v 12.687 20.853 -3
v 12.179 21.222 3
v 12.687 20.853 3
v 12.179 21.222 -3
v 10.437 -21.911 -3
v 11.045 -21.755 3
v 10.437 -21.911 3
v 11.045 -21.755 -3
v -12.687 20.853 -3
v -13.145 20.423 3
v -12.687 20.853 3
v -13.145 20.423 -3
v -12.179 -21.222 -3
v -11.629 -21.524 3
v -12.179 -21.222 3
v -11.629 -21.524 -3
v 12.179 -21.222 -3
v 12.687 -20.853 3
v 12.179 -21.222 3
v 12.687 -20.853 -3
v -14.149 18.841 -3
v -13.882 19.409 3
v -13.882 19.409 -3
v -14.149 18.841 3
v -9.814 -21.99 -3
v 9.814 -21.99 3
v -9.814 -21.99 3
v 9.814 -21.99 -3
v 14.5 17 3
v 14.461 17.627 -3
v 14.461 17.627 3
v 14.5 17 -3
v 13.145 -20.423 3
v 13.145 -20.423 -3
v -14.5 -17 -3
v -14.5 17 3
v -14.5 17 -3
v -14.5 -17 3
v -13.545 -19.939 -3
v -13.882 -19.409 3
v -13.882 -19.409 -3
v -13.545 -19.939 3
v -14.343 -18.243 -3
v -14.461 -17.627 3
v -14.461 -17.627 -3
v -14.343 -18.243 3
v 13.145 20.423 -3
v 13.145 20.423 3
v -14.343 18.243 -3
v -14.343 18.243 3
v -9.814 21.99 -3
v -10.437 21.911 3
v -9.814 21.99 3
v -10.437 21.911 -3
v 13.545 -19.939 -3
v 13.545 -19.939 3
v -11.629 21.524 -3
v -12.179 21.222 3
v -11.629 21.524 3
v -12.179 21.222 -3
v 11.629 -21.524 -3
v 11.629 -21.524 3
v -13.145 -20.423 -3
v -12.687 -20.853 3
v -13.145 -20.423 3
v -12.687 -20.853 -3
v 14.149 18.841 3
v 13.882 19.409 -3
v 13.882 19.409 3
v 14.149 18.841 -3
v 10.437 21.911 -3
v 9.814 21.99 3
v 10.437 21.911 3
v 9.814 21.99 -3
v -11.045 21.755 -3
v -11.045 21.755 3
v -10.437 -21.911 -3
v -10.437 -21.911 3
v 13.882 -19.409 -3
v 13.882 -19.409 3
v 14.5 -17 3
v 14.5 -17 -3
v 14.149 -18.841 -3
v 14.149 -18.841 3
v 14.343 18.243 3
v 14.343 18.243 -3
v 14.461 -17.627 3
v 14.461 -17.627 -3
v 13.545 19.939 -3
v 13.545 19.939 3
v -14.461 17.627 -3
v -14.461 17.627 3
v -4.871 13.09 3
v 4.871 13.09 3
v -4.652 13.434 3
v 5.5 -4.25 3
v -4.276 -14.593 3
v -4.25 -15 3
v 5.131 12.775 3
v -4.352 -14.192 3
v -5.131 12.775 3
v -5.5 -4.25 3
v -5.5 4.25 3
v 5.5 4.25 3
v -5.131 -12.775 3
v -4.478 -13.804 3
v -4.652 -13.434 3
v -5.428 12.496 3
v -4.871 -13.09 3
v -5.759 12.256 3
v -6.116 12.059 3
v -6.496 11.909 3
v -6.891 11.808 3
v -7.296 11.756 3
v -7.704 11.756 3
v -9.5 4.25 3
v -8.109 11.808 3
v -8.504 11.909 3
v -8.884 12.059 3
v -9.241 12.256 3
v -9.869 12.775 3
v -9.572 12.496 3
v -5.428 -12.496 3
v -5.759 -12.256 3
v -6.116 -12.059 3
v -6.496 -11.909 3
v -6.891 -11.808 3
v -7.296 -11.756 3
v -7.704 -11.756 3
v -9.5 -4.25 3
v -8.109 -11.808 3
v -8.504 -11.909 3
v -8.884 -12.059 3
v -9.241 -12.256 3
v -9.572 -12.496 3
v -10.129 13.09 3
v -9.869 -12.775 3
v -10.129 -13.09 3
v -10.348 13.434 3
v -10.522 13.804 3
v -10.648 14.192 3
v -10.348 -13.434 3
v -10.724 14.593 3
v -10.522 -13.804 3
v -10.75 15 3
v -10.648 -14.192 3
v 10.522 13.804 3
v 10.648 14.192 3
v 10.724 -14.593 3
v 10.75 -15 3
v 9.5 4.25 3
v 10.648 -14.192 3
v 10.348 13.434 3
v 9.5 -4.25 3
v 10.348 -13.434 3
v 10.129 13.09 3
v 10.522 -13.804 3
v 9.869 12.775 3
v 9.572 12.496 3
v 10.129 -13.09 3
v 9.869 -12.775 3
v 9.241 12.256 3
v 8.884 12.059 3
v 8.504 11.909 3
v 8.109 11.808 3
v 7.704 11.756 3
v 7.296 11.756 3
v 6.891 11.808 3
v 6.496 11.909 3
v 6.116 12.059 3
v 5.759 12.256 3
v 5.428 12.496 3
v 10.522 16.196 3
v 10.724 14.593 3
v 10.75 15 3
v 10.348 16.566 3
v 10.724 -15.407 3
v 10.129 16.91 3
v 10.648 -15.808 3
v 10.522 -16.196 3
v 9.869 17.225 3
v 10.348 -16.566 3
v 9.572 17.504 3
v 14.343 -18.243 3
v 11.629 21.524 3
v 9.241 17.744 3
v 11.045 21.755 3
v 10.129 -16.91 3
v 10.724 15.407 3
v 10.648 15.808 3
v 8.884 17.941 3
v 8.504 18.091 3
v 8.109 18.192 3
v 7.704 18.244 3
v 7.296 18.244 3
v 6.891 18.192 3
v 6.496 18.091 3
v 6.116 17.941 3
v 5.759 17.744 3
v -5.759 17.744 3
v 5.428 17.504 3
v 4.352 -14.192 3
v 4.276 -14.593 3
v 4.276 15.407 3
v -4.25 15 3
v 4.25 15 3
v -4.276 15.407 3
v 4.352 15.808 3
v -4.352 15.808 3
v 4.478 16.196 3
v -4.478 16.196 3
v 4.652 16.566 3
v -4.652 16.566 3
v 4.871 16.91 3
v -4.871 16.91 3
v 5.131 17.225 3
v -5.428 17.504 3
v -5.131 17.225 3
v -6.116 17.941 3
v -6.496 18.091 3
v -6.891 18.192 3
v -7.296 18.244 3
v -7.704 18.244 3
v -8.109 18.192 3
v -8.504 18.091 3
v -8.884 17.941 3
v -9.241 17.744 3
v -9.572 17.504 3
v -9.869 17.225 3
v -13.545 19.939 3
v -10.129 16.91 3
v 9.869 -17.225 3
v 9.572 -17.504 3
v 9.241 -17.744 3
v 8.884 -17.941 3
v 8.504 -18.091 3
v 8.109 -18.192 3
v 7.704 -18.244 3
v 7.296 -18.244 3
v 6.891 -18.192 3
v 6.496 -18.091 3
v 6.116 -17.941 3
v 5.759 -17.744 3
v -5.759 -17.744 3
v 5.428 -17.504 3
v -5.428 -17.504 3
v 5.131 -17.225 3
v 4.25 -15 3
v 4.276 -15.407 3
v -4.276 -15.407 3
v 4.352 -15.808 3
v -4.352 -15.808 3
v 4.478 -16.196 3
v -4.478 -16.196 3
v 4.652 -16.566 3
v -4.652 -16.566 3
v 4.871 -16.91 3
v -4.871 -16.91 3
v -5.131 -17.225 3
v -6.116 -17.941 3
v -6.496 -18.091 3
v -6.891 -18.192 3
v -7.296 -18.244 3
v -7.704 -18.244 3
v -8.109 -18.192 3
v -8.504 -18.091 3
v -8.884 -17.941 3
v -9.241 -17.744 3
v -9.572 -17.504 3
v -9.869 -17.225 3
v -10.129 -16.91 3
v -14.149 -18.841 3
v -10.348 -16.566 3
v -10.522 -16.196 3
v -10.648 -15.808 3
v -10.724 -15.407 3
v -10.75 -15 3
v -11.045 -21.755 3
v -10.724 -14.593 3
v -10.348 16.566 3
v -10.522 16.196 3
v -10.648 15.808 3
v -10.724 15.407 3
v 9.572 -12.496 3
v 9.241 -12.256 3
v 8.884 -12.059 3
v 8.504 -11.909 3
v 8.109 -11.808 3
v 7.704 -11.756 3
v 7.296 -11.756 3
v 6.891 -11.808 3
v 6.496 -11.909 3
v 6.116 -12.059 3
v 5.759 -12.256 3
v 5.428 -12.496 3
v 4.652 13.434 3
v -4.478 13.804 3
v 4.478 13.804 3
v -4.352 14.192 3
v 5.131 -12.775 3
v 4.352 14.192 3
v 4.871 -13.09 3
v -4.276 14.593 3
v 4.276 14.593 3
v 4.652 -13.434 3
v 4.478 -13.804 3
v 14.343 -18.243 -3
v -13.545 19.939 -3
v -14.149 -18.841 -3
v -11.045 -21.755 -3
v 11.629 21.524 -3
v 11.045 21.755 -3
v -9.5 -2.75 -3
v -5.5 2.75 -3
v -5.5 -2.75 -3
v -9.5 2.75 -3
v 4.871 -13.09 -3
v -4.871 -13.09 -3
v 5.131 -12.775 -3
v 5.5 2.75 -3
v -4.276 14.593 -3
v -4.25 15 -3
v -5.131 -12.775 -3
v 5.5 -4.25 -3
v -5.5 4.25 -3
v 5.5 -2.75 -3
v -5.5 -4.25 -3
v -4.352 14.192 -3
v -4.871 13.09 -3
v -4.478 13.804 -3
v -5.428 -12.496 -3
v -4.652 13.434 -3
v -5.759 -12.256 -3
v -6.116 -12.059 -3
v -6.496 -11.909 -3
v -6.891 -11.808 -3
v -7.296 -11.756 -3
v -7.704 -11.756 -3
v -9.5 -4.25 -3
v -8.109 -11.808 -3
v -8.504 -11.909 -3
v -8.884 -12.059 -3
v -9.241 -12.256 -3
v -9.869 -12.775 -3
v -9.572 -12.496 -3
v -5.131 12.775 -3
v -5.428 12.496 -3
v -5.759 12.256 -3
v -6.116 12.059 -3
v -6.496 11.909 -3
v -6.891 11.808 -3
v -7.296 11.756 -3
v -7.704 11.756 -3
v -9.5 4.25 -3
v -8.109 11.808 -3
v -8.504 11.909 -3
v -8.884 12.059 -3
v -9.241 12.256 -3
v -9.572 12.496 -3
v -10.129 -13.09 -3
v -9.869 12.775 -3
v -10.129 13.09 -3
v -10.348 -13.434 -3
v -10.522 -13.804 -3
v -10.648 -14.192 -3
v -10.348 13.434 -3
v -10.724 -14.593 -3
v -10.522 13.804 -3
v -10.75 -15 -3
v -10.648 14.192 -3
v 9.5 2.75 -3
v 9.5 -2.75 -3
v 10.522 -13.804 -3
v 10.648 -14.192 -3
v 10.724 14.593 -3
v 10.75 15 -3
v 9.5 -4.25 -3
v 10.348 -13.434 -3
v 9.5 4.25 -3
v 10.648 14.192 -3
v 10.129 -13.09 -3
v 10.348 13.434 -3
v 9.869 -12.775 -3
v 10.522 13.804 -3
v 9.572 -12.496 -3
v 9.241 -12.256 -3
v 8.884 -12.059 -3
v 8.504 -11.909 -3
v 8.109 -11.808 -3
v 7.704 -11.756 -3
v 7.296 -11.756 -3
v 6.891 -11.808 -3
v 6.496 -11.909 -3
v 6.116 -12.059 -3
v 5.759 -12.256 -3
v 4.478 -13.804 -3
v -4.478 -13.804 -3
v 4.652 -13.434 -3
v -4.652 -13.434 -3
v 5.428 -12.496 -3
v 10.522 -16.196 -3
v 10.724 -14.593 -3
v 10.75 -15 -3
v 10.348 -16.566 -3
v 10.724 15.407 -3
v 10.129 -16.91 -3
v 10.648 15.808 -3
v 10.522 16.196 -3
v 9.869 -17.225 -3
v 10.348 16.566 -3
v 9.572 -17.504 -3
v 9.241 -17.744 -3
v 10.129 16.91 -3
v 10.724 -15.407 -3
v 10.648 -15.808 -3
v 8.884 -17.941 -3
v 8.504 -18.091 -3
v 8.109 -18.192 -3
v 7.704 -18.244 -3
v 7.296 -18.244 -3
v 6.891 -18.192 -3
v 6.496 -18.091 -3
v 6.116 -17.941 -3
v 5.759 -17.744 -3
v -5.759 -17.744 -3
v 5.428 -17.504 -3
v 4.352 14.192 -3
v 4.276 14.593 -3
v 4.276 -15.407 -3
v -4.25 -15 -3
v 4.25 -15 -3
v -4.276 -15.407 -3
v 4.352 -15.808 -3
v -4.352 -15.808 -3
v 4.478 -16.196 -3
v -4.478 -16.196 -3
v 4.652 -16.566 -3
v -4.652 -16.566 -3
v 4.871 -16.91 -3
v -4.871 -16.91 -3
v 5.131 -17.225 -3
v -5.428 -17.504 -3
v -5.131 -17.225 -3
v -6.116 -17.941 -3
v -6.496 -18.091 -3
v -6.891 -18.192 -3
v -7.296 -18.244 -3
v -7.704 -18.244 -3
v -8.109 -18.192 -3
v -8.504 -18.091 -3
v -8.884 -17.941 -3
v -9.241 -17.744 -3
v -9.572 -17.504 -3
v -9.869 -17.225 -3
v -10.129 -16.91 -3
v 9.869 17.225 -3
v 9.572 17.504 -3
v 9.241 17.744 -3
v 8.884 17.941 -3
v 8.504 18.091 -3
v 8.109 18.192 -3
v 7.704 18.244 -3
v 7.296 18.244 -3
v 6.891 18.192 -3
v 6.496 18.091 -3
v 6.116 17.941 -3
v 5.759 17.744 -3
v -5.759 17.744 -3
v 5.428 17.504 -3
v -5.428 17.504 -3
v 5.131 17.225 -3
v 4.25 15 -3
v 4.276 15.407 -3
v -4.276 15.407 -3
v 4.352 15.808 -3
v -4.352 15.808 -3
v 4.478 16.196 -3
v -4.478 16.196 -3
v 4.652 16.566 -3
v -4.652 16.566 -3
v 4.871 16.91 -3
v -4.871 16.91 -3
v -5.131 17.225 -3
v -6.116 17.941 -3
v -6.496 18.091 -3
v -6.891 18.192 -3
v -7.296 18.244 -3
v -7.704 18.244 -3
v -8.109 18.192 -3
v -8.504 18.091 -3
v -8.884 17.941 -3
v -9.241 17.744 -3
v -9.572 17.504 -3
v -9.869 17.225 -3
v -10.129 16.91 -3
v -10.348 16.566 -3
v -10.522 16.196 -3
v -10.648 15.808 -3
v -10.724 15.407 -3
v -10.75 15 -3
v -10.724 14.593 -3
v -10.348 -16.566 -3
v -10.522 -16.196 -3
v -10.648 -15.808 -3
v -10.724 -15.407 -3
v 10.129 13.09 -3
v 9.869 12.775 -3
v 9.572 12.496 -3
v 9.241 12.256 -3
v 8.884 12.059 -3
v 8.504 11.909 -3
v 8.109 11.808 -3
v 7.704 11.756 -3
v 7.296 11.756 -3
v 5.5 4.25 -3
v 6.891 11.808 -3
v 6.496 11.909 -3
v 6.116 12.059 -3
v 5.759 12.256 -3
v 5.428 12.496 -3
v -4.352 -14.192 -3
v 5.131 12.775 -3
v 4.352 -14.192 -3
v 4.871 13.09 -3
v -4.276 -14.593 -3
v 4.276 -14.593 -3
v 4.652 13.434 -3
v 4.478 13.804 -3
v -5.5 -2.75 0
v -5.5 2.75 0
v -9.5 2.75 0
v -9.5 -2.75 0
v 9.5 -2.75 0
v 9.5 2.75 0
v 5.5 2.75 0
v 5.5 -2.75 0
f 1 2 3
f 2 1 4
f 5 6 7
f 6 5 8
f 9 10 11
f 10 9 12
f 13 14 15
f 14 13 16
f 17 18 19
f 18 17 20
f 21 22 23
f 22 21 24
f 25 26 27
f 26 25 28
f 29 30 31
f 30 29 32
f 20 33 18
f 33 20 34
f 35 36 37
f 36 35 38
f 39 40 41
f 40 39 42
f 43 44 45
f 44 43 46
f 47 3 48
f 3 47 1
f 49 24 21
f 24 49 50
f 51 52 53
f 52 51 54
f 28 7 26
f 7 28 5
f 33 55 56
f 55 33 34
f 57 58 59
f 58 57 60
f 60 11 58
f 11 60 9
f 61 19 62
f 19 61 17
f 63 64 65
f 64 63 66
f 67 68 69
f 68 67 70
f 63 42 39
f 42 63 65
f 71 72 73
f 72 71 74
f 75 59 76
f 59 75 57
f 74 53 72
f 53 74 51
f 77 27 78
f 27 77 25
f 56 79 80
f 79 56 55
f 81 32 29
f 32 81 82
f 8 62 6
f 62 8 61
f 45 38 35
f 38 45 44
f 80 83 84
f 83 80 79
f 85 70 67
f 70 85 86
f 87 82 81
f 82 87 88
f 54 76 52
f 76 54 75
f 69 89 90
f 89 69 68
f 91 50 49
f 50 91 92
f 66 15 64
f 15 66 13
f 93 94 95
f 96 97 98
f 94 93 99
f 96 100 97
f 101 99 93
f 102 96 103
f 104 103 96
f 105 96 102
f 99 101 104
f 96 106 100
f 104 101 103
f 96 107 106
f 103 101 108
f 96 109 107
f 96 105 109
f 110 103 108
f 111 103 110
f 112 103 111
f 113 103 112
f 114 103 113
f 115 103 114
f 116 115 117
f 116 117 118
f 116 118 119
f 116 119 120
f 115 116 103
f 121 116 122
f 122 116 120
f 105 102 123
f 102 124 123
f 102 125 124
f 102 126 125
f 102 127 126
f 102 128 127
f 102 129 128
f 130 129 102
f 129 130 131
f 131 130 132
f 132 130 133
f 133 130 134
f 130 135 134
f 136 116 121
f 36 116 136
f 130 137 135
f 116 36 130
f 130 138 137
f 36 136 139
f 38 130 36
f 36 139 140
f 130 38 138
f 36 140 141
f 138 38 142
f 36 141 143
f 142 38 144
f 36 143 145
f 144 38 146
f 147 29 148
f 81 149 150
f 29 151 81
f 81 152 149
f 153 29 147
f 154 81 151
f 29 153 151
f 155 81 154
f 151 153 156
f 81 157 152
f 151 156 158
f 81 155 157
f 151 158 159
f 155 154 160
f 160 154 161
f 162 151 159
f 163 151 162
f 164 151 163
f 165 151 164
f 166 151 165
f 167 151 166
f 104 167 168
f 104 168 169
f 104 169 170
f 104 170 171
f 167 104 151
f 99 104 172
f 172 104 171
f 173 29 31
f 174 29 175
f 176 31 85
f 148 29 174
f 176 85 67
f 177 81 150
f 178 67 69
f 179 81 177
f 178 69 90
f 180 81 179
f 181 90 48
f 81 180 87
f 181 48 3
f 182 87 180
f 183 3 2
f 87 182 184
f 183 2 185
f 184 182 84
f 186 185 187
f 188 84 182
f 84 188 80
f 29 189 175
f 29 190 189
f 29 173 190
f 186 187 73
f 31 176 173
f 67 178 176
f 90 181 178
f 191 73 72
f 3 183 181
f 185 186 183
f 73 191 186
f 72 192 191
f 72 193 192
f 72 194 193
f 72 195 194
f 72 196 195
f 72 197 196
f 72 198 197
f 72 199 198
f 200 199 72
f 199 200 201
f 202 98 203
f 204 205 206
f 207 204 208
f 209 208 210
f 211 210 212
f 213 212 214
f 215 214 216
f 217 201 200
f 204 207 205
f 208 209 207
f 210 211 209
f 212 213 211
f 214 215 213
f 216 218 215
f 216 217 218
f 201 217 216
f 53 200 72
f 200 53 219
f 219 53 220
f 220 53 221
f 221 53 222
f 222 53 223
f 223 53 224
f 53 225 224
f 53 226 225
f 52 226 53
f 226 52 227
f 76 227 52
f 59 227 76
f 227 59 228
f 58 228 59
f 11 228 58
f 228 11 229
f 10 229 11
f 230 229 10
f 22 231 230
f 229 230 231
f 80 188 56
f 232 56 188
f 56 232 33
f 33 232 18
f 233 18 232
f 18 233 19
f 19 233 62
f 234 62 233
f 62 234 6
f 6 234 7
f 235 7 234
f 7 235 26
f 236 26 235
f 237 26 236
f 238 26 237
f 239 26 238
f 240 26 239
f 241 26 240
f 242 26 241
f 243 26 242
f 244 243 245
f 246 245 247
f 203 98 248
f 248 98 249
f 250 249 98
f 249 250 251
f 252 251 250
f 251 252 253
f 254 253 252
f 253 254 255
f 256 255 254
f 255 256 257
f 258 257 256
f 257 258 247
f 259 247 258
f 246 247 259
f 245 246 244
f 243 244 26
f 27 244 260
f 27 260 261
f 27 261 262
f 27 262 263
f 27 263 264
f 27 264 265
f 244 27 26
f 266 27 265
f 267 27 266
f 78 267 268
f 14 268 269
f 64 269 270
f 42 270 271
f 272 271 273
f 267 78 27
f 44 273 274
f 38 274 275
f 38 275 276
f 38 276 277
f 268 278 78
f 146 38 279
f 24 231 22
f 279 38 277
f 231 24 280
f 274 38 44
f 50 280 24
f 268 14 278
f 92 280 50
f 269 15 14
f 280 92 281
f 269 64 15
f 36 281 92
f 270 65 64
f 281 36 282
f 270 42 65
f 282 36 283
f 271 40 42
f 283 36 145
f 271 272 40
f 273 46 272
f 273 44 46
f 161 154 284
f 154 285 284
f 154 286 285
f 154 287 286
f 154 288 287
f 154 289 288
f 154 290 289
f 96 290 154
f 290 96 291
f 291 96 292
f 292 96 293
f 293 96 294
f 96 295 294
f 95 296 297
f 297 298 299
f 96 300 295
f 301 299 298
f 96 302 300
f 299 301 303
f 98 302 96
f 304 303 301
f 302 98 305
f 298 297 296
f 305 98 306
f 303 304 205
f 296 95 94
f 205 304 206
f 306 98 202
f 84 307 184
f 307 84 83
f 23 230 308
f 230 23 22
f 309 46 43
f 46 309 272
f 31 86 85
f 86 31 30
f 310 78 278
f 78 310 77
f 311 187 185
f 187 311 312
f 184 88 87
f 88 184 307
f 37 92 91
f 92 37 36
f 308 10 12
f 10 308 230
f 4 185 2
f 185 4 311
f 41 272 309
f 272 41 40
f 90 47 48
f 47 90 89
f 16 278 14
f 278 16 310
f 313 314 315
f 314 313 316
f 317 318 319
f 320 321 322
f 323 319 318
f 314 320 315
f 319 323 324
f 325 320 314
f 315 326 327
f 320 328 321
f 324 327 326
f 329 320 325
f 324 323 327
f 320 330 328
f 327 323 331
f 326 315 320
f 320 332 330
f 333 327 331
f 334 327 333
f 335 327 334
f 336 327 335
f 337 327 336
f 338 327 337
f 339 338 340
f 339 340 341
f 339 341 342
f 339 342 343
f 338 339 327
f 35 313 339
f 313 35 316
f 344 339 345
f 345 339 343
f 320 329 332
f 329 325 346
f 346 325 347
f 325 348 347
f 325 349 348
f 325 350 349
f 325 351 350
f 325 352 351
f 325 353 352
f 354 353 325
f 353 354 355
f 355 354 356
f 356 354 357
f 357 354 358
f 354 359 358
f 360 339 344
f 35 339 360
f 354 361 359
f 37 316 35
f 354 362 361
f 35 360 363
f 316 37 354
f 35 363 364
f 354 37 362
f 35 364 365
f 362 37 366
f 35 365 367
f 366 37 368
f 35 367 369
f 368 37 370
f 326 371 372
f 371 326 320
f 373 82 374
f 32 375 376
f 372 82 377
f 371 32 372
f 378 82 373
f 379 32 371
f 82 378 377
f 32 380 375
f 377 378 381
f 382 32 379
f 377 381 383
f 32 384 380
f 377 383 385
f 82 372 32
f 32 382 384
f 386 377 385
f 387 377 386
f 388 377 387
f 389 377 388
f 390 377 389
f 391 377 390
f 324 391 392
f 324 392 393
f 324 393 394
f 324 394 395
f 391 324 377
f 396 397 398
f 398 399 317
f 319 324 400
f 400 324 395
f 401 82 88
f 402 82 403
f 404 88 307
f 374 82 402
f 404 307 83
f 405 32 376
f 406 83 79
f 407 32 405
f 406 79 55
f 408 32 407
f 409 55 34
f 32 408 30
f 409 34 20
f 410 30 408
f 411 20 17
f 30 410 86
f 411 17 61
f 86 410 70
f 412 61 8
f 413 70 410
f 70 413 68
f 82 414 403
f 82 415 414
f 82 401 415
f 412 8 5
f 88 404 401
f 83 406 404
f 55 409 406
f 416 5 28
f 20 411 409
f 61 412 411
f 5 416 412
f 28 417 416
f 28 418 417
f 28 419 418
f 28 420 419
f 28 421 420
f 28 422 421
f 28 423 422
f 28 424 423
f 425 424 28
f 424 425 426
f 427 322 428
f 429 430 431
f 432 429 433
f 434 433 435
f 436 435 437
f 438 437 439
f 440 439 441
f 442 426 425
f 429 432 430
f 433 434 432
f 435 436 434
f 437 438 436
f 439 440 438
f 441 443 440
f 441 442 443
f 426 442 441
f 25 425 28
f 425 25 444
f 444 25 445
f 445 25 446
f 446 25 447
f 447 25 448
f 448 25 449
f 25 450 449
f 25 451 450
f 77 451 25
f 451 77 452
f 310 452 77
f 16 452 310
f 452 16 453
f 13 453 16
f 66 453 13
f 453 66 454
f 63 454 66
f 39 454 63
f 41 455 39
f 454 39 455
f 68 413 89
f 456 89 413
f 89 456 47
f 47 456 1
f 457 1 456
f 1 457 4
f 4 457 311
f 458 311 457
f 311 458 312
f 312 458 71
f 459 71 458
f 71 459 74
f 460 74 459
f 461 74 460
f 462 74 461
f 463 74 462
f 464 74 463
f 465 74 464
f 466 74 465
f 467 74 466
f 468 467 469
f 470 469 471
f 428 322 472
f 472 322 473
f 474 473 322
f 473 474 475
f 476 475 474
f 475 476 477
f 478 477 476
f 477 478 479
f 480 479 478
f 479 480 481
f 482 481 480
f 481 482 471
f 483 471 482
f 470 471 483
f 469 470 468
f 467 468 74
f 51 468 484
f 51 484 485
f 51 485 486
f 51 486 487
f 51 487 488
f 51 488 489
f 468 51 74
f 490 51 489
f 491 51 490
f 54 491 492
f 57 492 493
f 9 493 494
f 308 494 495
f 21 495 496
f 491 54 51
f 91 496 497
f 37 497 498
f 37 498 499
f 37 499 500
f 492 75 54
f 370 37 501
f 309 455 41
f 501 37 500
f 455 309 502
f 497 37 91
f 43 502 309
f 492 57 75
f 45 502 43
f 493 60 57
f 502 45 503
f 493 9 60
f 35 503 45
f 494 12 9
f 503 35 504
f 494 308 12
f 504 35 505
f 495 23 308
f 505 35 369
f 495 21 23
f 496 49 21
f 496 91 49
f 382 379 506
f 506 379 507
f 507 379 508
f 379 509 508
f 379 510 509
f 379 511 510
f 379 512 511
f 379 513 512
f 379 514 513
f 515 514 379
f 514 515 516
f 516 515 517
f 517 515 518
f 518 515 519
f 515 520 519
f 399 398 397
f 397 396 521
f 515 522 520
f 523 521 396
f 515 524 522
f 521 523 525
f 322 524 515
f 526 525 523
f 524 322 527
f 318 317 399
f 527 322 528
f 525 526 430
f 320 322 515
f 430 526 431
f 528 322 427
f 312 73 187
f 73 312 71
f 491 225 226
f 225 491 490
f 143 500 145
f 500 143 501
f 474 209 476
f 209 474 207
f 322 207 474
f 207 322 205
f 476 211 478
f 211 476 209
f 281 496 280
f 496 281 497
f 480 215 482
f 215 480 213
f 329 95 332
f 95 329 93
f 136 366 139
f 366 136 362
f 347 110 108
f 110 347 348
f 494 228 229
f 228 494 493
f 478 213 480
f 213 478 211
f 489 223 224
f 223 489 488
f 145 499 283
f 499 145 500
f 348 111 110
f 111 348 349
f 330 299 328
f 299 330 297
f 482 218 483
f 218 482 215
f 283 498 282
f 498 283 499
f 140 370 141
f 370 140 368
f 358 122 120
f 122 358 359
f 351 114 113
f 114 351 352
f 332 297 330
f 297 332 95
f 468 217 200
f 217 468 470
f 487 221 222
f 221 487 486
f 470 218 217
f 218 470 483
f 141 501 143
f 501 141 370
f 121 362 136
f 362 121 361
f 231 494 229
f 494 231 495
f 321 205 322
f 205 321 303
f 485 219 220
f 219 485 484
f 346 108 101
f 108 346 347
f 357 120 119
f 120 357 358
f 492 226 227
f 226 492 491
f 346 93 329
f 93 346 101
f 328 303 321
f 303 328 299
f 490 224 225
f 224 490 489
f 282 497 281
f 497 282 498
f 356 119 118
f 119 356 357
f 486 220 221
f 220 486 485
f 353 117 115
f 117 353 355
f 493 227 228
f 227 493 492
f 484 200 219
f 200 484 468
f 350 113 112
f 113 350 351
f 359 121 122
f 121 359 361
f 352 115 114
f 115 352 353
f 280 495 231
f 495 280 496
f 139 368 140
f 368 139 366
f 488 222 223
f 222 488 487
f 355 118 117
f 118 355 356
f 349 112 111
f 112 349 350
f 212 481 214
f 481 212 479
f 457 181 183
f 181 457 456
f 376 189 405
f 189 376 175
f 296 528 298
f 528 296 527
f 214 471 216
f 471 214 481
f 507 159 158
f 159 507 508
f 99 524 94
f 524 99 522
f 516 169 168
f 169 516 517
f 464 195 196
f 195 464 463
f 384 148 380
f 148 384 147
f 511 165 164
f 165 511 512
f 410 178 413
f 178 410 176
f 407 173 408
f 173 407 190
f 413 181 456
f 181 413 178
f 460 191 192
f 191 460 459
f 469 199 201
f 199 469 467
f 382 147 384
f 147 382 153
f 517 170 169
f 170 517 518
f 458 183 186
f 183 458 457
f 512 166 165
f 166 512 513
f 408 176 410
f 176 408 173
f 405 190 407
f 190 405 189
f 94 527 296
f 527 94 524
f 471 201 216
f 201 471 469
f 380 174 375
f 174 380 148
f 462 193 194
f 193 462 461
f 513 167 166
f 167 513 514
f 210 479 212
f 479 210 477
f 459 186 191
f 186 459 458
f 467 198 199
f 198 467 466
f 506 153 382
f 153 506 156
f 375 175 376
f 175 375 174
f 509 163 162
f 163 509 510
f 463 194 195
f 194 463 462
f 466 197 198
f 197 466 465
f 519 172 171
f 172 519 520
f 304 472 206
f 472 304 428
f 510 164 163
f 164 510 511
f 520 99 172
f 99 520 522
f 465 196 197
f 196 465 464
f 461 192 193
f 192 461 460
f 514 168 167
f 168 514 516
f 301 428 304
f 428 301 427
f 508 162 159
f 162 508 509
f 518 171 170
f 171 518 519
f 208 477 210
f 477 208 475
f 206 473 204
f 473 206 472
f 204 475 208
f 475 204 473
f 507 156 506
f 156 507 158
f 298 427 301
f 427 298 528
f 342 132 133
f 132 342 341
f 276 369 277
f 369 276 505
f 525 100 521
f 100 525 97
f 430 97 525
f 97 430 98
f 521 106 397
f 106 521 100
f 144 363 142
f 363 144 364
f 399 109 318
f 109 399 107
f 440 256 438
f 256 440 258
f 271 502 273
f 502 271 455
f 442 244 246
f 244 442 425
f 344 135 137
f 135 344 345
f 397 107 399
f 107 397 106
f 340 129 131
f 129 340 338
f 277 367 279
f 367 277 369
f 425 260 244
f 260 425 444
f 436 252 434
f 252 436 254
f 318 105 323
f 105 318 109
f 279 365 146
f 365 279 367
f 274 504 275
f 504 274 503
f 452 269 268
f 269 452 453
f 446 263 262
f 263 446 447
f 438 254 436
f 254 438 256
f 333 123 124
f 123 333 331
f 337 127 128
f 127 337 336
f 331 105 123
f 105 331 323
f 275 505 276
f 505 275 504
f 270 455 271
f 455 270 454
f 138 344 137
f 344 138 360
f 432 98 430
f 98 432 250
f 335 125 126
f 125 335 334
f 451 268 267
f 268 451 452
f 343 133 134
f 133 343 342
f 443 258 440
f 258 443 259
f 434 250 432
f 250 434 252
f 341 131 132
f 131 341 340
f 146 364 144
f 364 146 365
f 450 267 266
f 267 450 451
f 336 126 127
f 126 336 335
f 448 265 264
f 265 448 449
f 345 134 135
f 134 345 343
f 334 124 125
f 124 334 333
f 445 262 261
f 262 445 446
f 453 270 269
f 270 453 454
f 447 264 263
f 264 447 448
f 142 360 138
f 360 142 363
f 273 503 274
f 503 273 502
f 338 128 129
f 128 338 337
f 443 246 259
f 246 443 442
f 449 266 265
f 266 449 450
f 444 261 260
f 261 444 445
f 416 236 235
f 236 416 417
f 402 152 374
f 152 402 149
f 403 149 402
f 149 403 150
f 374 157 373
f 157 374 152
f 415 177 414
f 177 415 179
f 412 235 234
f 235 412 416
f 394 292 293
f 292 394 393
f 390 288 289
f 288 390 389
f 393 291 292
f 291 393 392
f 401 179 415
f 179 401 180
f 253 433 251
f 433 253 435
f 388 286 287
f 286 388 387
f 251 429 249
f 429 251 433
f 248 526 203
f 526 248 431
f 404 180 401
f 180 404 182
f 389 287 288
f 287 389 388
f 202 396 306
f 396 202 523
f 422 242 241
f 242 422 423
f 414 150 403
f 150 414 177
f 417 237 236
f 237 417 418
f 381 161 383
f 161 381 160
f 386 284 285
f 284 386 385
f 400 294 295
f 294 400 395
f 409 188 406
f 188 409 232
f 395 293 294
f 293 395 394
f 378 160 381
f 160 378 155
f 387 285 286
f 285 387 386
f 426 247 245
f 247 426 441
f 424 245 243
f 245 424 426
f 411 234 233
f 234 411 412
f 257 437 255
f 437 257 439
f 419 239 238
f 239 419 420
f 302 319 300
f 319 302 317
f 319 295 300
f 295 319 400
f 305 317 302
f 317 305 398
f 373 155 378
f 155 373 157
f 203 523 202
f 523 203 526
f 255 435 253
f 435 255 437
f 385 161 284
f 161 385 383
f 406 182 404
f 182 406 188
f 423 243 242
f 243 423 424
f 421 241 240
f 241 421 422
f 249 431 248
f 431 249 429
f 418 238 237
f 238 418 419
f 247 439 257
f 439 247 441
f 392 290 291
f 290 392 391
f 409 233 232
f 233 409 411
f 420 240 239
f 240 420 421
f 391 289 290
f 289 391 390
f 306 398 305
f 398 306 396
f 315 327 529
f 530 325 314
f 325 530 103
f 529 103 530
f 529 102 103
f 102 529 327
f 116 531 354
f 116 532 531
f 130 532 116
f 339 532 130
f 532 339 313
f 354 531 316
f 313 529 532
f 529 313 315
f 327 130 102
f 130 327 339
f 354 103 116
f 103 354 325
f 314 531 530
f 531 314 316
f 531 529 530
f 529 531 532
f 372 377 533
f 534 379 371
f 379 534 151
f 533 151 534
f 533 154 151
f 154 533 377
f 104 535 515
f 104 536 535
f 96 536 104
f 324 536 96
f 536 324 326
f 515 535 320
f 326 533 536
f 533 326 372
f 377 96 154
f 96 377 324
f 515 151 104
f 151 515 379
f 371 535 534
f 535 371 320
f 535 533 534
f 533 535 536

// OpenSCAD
$fn = 50;


difference() {
	union() {
		translate(v = [0, 0, -3.0000000000]) {
			hull() {
				translate(v = [-9.5000000000, 17.0000000000, 0]) {
					cylinder(h = 6, r = 5);
				}
				translate(v = [9.5000000000, 17.0000000000, 0]) {
					cylinder(h = 6, r = 5);
				}
				translate(v = [-9.5000000000, -17.0000000000, 0]) {
					cylinder(h = 6, r = 5);
				}
				translate(v = [9.5000000000, -17.0000000000, 0]) {
					cylinder(h = 6, r = 5);
				}
			}
		}
		translate(v = [0, 0, -3.0000000000]) {
			hull() {
				translate(v = [-9.5000000000, 17.0000000000, 0]) {
					cylinder(h = 6, r = 5);
				}
				translate(v = [9.5000000000, 17.0000000000, 0]) {
					cylinder(h = 6, r = 5);
				}
				translate(v = [-9.5000000000, -17.0000000000, 0]) {
					cylinder(h = 6, r = 5);
				}
				translate(v = [9.5000000000, -17.0000000000, 0]) {
					cylinder(h = 6, r = 5);
				}
			}
		}
	}
	union() {
		translate(v = [-7.5000000000, 15.0000000000, -50.0000000000]) {
			cylinder(h = 100, r = 3.2500000000);
		}
		translate(v = [7.5000000000, 15.0000000000, -50.0000000000]) {
			cylinder(h = 100, r = 3.2500000000);
		}
		translate(v = [-7.5000000000, -15.0000000000, -50.0000000000]) {
			cylinder(h = 100, r = 3.2500000000);
		}
		translate(v = [7.5000000000, -15.0000000000, -50.0000000000]) {
			cylinder(h = 100, r = 3.2500000000);
		}
		translate(v = [-9.5000000000, -4.2500000000, -50]) {
			cube(size = [4, 1.5000000000, 100]);
		}
		translate(v = [-9.5000000000, 2.7500000000, -50]) {
			cube(size = [4, 1.5000000000, 100]);
		}
		translate(v = [-9.5000000000, -4.2500000000, 0]) {
			cube(size = [4, 8.5000000000, 3]);
		}
		translate(v = [5.5000000000, -4.2500000000, -50]) {
			cube(size = [4, 1.5000000000, 100]);
		}
		translate(v = [5.5000000000, 2.7500000000, -50]) {
			cube(size = [4, 1.5000000000, 100]);
		}
		translate(v = [5.5000000000, -4.2500000000, 0]) {
			cube(size = [4, 8.5000000000, 3]);
		}
	}
}
